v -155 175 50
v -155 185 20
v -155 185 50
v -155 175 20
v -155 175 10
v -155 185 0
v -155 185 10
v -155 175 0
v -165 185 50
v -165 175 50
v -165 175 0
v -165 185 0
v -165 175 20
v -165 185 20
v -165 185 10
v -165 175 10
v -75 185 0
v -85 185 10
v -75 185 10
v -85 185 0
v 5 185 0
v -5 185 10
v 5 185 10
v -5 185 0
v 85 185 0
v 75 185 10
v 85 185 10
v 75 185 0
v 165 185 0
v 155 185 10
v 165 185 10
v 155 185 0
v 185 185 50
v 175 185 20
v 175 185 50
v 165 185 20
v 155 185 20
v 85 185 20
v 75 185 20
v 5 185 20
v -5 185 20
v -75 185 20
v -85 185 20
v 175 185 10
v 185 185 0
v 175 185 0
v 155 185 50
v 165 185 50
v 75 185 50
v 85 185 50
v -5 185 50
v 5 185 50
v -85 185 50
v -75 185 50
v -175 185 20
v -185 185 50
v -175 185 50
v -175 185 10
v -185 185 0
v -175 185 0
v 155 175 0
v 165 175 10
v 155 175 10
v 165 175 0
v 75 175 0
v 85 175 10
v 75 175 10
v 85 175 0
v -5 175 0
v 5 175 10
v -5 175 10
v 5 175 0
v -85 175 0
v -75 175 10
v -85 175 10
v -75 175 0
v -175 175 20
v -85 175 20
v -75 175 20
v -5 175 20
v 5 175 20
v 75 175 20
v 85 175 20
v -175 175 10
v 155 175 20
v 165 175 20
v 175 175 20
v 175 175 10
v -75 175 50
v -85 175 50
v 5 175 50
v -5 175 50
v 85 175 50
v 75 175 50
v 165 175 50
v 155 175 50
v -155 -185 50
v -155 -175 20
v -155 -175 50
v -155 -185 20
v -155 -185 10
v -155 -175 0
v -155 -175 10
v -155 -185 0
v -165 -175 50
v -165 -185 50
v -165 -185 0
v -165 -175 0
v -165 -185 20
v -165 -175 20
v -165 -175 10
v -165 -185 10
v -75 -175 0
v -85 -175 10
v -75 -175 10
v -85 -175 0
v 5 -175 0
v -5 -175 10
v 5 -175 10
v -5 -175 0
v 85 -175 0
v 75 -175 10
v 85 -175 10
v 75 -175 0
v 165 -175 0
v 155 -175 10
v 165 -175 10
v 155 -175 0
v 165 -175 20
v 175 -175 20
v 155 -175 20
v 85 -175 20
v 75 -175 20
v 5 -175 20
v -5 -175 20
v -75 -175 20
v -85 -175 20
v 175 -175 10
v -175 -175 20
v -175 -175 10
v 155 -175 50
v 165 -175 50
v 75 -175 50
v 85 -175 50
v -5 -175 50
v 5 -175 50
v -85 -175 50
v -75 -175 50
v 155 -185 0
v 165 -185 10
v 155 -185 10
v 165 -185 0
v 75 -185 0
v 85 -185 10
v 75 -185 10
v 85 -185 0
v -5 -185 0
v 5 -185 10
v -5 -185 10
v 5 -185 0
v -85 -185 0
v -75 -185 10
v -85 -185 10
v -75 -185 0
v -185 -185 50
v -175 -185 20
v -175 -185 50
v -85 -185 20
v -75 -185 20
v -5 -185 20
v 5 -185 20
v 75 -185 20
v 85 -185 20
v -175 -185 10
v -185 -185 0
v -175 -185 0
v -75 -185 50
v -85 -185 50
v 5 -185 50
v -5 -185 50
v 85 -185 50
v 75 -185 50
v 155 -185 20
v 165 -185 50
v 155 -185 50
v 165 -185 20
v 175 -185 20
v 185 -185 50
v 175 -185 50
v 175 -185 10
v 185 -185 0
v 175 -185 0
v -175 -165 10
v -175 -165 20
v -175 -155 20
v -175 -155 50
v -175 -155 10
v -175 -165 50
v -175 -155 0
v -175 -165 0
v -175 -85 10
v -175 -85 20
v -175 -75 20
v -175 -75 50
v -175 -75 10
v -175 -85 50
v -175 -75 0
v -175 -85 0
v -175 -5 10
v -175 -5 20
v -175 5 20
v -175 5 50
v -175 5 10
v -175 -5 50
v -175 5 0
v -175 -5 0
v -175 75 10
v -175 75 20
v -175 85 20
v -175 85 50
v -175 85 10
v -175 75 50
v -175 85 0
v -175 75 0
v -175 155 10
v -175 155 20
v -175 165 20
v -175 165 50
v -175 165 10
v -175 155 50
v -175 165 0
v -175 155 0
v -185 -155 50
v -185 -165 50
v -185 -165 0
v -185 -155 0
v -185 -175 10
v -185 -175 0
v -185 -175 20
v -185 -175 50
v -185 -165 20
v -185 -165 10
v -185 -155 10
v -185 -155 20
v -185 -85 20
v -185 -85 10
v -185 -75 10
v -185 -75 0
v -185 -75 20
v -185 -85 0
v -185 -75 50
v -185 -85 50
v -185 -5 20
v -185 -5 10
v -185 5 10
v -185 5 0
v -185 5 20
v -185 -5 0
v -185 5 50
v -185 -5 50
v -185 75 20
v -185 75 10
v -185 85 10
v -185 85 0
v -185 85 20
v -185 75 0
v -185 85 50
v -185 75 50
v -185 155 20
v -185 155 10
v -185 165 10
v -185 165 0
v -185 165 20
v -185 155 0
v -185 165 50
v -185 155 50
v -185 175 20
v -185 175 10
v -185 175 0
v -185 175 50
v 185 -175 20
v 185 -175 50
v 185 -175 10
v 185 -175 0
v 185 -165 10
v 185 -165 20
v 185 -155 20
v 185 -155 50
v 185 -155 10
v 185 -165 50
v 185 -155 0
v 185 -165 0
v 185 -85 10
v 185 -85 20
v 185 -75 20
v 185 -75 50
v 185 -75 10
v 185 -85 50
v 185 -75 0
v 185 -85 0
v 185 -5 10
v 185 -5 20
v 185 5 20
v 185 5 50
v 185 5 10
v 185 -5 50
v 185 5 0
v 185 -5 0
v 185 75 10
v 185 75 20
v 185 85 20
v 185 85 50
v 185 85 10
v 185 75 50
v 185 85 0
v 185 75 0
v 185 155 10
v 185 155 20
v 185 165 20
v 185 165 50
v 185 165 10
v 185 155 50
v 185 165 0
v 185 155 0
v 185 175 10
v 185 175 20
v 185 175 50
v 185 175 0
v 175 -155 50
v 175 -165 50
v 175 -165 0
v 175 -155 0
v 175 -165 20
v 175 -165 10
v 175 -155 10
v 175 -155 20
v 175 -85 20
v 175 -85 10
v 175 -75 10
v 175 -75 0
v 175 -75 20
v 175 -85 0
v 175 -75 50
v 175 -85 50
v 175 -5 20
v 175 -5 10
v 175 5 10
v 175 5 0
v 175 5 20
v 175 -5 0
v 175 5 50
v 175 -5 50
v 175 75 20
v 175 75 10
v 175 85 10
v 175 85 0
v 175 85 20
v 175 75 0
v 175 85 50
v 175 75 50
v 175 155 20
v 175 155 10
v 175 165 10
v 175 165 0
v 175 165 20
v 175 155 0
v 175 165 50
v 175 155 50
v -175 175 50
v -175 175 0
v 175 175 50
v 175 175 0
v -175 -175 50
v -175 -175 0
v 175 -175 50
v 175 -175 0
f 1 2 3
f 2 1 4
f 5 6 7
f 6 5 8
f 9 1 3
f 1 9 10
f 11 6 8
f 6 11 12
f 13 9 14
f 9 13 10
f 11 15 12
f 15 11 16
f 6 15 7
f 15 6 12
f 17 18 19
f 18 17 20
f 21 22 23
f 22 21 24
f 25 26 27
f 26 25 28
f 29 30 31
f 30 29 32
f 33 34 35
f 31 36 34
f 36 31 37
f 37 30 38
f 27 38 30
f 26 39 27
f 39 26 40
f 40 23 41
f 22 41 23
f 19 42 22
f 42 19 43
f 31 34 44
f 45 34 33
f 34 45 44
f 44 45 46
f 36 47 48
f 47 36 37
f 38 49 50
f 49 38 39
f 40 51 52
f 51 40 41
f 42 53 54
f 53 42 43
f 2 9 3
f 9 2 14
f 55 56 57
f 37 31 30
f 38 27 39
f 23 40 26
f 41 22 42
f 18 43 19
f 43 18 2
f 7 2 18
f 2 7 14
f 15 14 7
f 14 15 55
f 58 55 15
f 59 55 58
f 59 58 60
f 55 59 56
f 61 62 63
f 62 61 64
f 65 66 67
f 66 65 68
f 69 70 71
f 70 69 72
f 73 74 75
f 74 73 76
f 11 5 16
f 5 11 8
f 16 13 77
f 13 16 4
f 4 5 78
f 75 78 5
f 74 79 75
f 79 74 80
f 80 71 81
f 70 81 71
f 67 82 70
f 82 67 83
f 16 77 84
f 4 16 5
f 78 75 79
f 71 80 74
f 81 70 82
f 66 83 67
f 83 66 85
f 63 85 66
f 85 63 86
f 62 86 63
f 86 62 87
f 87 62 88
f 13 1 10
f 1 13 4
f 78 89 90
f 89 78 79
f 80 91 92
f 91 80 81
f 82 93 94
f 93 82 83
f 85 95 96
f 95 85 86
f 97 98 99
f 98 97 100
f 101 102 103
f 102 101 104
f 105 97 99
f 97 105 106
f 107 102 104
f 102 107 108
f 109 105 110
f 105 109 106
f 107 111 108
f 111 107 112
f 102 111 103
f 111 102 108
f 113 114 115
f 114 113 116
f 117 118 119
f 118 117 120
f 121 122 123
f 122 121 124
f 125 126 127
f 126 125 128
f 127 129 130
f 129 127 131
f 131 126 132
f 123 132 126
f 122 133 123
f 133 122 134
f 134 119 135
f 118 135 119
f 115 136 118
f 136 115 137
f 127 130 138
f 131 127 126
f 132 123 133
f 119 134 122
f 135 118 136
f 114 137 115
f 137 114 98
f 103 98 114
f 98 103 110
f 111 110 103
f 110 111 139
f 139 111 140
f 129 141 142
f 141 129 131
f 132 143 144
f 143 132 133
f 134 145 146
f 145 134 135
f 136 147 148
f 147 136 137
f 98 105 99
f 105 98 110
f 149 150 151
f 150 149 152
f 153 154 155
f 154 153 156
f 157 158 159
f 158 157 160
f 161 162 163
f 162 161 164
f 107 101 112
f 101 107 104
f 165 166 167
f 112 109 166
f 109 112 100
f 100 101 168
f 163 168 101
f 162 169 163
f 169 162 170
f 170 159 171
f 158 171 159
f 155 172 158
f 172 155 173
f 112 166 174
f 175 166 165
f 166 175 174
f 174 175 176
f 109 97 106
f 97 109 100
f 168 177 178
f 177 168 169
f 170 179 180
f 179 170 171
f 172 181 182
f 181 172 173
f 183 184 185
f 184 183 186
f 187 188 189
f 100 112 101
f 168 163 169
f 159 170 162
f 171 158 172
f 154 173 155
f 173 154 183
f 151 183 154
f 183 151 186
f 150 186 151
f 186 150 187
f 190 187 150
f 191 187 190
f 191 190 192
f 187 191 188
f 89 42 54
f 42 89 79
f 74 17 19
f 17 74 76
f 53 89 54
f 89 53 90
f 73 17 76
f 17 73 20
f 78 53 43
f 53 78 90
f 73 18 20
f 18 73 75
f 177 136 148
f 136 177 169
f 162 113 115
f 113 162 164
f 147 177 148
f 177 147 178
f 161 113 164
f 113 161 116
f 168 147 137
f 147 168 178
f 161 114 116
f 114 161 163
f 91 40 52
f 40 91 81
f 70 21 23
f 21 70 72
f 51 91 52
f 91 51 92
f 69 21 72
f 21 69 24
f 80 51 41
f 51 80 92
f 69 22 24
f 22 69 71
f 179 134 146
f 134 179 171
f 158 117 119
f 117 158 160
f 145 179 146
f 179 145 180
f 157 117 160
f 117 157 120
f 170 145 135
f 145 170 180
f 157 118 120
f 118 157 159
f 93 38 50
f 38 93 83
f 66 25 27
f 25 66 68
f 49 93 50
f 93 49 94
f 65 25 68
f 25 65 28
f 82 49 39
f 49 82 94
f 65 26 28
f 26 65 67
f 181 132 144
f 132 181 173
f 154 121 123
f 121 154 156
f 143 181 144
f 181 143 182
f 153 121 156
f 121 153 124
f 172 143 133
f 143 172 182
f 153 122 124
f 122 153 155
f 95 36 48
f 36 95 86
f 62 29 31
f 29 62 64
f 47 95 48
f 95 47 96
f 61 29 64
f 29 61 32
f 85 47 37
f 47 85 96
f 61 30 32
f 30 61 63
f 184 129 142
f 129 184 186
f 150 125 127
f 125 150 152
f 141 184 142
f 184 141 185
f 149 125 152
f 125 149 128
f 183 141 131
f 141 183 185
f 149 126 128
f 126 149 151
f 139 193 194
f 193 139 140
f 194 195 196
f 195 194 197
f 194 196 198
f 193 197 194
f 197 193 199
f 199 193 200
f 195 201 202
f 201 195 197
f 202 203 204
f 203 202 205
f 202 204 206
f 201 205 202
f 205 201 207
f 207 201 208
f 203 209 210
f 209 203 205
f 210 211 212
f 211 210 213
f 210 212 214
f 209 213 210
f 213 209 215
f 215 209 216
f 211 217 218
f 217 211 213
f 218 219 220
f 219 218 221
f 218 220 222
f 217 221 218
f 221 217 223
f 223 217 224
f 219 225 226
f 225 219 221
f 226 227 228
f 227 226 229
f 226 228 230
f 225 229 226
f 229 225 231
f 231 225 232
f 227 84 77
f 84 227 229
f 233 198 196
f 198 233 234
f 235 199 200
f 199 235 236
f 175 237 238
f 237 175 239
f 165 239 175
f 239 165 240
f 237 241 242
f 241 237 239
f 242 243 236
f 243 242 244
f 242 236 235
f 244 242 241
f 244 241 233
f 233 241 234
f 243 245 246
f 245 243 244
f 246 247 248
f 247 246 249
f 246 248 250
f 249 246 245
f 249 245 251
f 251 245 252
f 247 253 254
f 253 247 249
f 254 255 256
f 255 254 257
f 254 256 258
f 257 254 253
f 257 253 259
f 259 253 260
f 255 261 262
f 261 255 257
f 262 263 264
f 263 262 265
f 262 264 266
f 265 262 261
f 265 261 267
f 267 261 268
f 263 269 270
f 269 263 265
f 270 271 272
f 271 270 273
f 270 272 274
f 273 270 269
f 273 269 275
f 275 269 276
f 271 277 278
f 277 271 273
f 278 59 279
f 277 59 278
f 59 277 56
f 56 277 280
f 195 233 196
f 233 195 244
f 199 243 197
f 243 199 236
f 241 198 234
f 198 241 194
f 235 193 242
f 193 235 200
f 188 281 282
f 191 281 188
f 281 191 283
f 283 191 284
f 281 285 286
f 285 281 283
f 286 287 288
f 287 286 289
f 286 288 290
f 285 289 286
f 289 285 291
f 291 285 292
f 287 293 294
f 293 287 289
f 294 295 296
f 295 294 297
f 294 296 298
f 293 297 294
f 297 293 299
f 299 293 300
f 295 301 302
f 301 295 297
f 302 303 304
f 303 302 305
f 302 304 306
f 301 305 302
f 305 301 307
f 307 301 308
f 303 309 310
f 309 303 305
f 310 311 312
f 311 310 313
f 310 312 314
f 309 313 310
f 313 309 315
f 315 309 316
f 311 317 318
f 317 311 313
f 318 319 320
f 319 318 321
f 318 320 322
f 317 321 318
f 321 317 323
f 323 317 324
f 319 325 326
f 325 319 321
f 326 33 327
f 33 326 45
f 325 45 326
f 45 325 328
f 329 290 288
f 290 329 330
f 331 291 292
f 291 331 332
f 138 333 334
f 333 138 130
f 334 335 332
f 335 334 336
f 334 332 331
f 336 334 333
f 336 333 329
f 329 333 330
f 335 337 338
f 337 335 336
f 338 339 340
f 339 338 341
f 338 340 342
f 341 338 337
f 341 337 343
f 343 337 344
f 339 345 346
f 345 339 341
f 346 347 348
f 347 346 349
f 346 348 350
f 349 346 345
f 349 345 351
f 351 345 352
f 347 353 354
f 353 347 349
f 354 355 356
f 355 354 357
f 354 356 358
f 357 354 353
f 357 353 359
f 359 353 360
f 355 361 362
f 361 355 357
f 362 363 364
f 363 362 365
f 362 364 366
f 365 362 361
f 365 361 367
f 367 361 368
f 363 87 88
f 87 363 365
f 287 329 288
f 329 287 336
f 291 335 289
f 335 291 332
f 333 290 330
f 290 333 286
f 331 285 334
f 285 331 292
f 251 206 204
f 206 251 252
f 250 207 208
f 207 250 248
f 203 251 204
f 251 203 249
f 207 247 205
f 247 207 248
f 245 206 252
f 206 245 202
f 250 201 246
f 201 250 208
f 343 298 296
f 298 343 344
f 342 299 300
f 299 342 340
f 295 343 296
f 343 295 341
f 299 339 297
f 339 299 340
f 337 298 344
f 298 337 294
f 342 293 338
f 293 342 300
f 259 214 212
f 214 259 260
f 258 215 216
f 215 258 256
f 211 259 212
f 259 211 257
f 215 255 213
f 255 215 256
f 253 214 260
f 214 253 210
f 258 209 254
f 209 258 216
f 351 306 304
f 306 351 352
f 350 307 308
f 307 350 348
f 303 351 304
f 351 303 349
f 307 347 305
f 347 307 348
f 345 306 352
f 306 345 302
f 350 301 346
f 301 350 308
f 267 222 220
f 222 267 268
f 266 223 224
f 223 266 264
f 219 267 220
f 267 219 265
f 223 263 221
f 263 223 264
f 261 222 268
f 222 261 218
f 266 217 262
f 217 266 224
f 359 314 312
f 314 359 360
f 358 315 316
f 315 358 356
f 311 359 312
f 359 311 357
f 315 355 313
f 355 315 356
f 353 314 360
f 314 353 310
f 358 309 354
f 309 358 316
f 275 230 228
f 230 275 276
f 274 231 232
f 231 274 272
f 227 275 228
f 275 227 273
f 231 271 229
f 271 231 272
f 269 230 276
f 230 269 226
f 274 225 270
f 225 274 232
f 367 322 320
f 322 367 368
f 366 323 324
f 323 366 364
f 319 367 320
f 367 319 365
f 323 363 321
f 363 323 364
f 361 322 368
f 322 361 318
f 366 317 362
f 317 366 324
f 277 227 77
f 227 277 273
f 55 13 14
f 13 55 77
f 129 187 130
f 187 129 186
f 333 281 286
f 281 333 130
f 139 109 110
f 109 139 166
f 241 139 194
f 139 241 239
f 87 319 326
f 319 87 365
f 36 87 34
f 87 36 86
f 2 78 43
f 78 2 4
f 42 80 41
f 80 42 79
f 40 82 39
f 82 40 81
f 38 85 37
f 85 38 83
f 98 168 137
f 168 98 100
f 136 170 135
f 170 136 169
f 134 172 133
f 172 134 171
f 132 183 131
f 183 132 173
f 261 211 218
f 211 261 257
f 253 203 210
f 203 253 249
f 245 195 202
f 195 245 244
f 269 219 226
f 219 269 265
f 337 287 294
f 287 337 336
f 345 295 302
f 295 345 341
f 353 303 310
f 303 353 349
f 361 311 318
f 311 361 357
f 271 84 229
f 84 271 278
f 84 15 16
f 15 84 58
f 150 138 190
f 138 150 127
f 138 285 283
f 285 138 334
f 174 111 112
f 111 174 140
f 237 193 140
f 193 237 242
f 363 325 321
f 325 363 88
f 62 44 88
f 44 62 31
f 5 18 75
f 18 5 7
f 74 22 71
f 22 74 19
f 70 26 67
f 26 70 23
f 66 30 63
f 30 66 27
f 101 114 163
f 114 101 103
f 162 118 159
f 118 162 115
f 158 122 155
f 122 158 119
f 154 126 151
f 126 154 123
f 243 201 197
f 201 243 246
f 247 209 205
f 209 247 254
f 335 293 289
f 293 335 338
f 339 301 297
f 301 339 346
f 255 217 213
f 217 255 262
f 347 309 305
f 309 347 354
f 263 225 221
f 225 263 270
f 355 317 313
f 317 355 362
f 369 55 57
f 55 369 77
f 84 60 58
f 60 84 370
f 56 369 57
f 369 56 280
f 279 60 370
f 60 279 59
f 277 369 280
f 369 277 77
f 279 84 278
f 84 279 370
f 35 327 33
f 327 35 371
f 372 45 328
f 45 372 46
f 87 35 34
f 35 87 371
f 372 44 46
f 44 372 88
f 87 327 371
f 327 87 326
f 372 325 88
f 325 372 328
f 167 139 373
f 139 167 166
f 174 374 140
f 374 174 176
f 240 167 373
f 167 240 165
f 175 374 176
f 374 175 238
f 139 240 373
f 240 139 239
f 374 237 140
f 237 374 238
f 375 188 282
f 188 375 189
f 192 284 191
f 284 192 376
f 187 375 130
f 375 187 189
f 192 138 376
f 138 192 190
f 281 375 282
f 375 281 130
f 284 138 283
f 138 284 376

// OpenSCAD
// Cage slice 3
// Internal cavity: 350 x 350 x 700 mm
// Bar thickness: 10 mm (square)
// Gap between bars: 70 mm (uniform)
// Slice index: 3, slice Z range: [150, 200] (local coordinates 0..50)
// This file places the slice with its bottom on Z=0; when assembling, translate in Z by 150 mm.
// Export to STL with OpenSCAD: Render -> Export as STL.

bar = 10;
gap = 70;
s = bar + gap;
$fn = 64;  // cylinder resolution

x_centers = [-160, -80, 0, 80, 160];
y_centers = [-160, -80, 0, 80, 160];
z_centers = [5, 85, 165, 245, 325, 405, 485, 565, 645];

slice_index = 3;
slice_h = 50;

front_y = 180;
back_y = -180;
left_x = -180;
right_x = 180;
panel_length = 370;

hole_diam = 6.6;

module slice() {
    union() {
        // vertical bars on front and back (along Z)
        for (x = x_centers) {
            translate([x, front_y, slice_h/2]) cube([bar, bar, slice_h], center=true);
            translate([x, back_y, slice_h/2])  cube([bar, bar, slice_h], center=true);
        }
        // vertical bars on left and right (along Z)
        for (y = y_centers) {
            translate([left_x, y, slice_h/2])  cube([bar, bar, slice_h], center=true);
            translate([right_x, y, slice_h/2]) cube([bar, bar, slice_h], center=true);
        }
        // explicit corner vertical bars (ensure 4 corners for M6 rods)
        translate([-180, 180, slice_h/2]) cube([bar, bar, slice_h], center=true);
        translate([180, 180, slice_h/2]) cube([bar, bar, slice_h], center=true);
        translate([-180, -180, slice_h/2]) cube([bar, bar, slice_h], center=true);
        translate([180, -180, slice_h/2]) cube([bar, bar, slice_h], center=true);

        // horizontal bars (10 mm thick in Z) that lie inside this slice
        for (zc = z_centers) {
            z_local = zc - slice_index*slice_h;
            // include this horizontal bar if its center lies within this slice and it fits entirely here
            if (z_local >= bar/2 && z_local <= slice_h - bar/2) {
                // front and back horizontal bars (run along X)
                translate([0, front_y, z_local]) cube([panel_length, bar, bar], center=true);
                translate([0, back_y,  z_local]) cube([panel_length, bar, bar], center=true);
                // left and right horizontal bars (run along Y)
                translate([left_x, 0, z_local]) cube([bar, panel_length, bar], center=true);
                translate([right_x,0, z_local]) cube([bar, panel_length, bar], center=true);
            }
        }
    }
}

difference() {
    slice();
    // four vertical holes for M6 rods through corner bars (slightly longer than slice to ensure clean subtraction)
    translate([-180, 180, slice_h/2]) rotate([0,0,0]) cylinder(h = slice_h*4, r = hole_diam/2, center=true);
    translate([180, 180, slice_h/2]) rotate([0,0,0]) cylinder(h = slice_h*4, r = hole_diam/2, center=true);
    translate([-180, -180, slice_h/2]) rotate([0,0,0]) cylinder(h = slice_h*4, r = hole_diam/2, center=true);
    translate([180, -180, slice_h/2]) rotate([0,0,0]) cylinder(h = slice_h*4, r = hole_diam/2, center=true);
}

slice();
